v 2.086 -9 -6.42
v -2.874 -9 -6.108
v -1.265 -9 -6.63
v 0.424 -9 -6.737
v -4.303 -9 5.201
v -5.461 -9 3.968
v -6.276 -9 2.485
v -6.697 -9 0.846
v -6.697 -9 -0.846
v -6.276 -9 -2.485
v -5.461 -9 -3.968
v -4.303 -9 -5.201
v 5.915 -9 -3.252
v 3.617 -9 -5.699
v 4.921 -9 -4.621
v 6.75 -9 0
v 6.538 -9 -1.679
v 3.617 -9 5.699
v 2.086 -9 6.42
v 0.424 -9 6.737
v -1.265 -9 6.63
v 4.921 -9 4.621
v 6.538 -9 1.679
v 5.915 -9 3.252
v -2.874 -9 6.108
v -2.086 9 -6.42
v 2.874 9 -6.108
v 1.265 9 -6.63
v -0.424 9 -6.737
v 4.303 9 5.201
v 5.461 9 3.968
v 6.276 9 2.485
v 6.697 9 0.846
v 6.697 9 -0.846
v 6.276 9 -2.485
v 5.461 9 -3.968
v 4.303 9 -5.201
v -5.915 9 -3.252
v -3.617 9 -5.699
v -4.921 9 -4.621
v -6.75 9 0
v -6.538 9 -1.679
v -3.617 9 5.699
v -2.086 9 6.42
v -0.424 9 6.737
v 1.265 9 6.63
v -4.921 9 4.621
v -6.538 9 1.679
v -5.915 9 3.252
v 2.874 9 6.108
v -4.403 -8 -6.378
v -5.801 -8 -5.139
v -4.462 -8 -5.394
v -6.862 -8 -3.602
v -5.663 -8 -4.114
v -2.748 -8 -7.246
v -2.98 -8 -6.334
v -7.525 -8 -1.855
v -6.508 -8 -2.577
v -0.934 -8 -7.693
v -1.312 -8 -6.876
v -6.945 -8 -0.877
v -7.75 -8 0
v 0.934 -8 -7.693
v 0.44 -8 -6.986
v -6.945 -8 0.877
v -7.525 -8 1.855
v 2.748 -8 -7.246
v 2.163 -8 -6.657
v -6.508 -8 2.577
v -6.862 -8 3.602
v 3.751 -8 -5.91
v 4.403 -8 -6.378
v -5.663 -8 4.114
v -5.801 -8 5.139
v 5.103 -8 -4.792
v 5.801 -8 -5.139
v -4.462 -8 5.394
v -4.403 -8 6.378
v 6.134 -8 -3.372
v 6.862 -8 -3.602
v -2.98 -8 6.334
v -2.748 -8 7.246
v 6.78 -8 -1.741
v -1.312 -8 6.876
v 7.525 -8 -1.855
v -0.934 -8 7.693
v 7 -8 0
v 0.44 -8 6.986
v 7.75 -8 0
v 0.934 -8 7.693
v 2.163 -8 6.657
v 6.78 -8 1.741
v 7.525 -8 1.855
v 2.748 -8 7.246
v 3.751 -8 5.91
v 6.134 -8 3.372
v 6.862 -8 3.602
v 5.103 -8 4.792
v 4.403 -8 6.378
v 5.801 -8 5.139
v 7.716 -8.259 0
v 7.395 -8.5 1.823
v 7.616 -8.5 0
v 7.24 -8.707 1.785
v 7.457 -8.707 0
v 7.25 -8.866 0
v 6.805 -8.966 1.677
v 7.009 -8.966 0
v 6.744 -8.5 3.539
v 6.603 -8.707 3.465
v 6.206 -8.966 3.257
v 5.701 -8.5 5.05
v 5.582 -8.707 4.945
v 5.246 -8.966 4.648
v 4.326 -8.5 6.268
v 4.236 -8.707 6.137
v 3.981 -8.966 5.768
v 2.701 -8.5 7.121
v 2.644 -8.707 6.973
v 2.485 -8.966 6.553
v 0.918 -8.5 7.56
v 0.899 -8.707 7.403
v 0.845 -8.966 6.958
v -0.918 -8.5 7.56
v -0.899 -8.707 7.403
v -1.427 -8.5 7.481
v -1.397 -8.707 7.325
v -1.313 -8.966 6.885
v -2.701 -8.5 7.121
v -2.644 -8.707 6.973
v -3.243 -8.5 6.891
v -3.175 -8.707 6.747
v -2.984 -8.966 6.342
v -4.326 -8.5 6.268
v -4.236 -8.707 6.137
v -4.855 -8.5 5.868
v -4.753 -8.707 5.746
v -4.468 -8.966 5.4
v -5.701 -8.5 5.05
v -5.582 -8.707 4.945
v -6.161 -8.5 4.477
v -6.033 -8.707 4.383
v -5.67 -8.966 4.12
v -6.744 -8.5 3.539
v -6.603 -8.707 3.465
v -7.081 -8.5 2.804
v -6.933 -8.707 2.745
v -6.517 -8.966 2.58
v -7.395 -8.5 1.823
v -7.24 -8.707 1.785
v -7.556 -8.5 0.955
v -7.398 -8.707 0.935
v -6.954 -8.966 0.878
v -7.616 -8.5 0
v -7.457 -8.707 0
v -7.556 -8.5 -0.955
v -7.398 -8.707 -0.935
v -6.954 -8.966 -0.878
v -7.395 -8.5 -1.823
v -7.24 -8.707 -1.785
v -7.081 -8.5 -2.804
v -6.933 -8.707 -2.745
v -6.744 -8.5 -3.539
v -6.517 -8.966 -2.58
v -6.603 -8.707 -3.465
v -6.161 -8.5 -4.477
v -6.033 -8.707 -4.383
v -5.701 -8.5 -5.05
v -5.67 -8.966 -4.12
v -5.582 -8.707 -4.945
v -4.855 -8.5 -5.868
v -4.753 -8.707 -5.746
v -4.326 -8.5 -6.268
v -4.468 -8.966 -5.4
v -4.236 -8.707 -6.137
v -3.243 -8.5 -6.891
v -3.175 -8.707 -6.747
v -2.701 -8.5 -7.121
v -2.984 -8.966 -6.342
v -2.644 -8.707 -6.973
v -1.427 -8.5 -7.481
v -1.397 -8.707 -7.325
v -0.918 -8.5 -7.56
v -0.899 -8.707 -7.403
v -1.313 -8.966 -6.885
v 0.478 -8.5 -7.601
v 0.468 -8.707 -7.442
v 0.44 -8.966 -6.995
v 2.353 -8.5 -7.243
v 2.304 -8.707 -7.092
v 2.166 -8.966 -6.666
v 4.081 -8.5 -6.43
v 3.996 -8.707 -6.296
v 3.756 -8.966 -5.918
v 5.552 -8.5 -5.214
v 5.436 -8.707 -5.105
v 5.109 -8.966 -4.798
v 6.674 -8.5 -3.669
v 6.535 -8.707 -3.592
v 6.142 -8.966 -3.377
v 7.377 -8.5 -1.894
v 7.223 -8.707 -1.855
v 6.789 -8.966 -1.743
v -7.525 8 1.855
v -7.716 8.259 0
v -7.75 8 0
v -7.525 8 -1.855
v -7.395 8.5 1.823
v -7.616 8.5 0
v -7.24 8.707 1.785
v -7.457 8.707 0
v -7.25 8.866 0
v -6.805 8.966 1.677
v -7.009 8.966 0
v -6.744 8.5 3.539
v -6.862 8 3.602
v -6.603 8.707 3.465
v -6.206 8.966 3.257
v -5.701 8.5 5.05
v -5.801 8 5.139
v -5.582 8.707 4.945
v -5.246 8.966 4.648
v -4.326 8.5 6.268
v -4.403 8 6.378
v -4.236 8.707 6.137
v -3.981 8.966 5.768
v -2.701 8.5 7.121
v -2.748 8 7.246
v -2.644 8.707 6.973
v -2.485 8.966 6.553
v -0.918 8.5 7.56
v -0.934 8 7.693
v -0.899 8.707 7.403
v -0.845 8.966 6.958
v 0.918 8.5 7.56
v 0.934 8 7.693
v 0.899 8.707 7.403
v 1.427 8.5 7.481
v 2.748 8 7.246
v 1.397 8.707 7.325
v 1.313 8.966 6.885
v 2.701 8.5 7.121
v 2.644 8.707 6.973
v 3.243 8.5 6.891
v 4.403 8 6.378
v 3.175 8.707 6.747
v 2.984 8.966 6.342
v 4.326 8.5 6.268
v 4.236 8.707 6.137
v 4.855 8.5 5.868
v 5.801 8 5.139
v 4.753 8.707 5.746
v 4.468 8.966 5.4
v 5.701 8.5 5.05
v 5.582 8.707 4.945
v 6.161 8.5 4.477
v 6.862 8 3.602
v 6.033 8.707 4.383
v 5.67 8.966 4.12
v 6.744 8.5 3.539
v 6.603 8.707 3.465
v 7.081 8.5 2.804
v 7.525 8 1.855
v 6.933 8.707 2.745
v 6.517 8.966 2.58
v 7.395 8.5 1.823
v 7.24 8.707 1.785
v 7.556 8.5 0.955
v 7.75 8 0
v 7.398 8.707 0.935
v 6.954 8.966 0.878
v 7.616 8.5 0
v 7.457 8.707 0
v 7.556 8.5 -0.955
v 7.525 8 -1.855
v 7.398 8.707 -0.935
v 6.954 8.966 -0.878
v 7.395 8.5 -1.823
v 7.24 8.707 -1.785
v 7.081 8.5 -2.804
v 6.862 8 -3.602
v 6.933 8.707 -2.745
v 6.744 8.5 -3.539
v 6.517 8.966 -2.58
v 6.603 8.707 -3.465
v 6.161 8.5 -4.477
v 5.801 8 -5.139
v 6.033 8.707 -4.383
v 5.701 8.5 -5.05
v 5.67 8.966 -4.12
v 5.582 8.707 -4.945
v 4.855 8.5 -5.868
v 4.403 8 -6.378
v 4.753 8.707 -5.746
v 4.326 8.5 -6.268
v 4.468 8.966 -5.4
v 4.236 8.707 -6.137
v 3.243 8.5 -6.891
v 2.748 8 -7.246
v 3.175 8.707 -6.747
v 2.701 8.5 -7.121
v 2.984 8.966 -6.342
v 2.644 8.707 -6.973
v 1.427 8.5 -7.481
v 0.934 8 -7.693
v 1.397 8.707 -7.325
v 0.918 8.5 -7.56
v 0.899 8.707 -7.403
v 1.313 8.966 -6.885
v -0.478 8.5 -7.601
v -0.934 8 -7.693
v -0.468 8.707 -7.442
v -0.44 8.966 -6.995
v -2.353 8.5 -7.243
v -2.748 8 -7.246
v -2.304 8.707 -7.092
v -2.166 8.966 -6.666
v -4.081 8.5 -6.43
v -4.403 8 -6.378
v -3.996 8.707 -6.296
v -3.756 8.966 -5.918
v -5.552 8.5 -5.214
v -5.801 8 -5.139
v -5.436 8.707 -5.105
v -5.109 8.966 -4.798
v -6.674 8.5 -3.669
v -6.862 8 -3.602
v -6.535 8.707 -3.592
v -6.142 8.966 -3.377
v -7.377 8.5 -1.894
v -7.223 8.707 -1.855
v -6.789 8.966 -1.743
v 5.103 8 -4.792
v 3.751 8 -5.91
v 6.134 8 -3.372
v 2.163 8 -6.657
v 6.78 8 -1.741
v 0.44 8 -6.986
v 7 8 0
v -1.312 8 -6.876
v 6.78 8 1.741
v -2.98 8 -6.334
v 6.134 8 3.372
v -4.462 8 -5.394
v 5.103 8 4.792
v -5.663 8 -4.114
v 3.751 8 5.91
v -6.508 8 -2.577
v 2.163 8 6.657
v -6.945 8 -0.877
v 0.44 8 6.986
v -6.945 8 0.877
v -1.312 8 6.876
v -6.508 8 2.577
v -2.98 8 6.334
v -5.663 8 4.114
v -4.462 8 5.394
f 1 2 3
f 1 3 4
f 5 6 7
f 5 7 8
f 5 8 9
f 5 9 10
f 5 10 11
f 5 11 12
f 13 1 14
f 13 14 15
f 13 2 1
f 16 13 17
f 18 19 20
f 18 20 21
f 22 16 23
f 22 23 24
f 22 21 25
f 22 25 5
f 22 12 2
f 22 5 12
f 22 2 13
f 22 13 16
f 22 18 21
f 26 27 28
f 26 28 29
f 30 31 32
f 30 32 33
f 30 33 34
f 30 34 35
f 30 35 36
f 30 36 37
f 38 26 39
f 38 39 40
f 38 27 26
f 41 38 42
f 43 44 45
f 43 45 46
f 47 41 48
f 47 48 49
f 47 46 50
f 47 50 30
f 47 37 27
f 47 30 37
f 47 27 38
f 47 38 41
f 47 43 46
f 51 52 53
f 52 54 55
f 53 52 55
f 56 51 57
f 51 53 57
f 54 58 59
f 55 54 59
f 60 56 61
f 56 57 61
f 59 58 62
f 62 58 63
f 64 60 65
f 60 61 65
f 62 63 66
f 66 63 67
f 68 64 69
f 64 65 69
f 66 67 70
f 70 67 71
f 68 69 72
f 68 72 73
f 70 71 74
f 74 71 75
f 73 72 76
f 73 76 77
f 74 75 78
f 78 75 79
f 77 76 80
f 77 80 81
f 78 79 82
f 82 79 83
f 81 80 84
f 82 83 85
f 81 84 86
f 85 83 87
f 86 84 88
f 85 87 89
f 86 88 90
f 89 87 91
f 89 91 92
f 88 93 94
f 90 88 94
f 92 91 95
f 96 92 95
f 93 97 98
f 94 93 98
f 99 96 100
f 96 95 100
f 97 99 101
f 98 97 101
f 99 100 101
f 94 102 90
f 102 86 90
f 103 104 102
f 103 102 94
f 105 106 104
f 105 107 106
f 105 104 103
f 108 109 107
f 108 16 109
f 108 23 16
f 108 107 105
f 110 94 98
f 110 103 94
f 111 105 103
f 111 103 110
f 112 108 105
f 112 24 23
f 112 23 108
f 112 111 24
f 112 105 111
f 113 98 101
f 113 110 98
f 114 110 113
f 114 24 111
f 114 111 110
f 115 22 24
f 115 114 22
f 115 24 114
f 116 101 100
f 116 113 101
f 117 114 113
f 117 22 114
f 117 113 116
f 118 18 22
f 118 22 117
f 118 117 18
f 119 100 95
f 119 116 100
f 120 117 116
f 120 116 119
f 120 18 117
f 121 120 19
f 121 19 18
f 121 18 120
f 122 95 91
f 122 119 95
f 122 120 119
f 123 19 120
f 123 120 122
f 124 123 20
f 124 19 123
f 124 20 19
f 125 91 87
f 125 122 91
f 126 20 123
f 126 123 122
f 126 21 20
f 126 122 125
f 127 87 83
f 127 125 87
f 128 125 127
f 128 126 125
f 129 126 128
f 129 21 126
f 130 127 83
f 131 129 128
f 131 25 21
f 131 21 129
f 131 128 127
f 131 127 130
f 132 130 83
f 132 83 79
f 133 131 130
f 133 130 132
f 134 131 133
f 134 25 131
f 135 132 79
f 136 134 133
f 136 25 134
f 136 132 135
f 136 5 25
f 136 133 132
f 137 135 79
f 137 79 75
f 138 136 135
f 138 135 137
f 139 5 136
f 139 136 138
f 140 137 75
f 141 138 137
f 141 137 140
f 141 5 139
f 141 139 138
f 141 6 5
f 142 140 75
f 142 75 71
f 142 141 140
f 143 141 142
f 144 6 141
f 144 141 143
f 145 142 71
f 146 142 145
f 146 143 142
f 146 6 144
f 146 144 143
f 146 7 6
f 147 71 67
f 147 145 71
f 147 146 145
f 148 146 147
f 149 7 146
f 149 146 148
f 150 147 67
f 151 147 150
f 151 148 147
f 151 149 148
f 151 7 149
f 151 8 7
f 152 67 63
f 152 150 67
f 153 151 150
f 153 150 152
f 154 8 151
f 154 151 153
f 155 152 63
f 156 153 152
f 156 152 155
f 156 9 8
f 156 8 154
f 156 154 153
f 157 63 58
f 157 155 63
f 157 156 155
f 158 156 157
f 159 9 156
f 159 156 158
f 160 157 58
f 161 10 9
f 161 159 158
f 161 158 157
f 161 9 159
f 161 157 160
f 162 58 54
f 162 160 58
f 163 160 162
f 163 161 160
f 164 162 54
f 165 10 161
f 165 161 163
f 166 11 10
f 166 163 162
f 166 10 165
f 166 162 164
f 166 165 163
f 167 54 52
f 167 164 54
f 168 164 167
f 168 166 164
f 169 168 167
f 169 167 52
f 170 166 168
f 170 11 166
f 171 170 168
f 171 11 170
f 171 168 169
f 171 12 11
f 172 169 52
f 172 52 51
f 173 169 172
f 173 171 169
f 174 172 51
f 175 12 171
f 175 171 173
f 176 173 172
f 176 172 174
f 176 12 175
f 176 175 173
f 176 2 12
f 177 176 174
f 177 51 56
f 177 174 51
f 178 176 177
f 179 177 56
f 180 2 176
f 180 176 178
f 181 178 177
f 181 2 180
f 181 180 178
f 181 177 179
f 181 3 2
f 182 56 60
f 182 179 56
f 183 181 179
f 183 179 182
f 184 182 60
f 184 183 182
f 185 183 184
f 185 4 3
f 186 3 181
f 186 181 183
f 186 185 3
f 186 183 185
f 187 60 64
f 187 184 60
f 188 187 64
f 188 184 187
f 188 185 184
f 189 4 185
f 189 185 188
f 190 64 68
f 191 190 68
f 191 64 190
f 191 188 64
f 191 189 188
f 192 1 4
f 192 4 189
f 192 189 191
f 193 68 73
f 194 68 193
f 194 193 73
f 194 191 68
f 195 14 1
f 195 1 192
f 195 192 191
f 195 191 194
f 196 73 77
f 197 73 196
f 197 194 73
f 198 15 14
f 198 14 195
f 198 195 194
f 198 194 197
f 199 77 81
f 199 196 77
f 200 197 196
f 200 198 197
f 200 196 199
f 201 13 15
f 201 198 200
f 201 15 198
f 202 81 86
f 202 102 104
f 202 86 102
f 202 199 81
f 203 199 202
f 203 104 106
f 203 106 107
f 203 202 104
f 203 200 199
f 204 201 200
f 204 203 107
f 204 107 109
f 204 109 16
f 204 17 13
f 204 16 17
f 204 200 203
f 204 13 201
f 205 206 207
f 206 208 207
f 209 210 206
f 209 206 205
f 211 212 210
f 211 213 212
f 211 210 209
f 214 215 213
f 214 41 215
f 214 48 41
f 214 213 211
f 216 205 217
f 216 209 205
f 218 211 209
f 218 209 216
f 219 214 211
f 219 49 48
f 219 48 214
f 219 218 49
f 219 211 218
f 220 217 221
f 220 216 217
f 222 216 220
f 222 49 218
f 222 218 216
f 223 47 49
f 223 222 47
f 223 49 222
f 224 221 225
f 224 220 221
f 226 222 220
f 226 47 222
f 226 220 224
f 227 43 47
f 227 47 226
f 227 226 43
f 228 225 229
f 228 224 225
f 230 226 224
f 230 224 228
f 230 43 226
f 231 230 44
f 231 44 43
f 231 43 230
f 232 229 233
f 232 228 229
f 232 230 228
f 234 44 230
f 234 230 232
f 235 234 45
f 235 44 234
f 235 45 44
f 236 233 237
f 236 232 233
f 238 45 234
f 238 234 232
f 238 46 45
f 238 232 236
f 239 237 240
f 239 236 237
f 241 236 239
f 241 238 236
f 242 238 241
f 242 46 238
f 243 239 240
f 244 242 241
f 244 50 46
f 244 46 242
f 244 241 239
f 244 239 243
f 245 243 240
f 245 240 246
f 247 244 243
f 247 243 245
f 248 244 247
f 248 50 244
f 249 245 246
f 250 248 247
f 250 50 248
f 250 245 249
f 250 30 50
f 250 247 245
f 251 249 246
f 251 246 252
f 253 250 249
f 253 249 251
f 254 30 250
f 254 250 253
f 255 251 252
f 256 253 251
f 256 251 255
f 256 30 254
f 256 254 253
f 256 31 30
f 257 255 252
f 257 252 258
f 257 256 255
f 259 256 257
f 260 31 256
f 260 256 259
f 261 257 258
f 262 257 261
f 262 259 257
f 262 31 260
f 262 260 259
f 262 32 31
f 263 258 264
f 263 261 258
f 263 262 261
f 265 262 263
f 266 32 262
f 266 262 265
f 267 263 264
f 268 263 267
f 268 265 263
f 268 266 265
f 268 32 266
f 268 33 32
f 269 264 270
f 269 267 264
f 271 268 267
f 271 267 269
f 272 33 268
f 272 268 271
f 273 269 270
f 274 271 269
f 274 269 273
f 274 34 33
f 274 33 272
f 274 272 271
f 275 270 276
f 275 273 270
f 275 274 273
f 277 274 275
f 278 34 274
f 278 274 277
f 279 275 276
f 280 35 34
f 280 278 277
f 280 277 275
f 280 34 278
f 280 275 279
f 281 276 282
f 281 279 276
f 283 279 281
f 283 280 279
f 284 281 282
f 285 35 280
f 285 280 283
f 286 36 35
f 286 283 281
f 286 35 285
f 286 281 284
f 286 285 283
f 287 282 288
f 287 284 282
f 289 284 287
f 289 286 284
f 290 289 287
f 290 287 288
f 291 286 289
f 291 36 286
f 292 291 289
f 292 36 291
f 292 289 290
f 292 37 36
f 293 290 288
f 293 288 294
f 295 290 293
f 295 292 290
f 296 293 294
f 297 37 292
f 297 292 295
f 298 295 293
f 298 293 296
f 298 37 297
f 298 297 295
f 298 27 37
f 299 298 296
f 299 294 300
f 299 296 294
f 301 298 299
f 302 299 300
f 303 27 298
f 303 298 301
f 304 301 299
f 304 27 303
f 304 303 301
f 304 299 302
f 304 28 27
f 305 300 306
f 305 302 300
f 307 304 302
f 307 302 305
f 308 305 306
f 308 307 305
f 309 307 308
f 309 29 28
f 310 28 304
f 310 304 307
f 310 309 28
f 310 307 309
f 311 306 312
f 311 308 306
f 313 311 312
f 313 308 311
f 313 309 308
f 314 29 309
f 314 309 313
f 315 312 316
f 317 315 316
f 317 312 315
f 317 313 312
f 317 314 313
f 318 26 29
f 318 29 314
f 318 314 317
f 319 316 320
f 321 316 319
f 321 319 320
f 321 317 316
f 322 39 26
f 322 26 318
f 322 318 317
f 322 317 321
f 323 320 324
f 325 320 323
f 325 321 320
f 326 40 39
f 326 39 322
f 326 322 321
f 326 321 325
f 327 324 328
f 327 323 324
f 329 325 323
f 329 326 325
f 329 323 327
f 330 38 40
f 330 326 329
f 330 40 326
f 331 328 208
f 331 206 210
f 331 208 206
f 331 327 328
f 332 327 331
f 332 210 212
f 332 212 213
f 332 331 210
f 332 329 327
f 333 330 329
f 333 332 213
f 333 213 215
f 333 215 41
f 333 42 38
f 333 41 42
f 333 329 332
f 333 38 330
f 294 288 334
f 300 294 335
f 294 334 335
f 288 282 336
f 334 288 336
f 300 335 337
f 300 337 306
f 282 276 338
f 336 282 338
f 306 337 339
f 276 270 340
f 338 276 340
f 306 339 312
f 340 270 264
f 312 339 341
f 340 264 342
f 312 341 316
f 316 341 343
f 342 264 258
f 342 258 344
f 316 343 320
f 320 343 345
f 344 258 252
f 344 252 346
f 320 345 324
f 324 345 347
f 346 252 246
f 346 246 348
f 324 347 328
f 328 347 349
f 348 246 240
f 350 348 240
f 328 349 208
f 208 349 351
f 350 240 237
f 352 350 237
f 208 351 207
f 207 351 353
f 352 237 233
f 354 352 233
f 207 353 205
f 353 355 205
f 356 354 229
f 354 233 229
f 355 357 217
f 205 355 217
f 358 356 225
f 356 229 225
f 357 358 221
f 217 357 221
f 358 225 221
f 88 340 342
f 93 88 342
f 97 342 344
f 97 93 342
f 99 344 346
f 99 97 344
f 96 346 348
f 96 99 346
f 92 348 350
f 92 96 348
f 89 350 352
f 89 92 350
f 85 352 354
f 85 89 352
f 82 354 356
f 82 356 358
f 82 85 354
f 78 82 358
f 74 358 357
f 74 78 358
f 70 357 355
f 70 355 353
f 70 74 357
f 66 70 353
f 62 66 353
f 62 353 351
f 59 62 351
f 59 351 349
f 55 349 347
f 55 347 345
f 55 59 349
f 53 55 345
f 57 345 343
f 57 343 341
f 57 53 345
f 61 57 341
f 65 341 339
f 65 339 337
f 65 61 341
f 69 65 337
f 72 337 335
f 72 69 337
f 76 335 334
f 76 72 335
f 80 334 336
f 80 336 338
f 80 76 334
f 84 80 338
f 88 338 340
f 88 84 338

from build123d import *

# Parameters (mm, degrees)
F0_R     = 7
F1_DEPTH = 8
F2_R     = 7.75
F2_R_2   = 7
F3_DEPTH = 1
F4_R     = 7.75
F4_R_2   = 7
F5_DEPTH = 1
F6_R     = 0.99999


# Not quite as in the source:
# - a fillet or chamfer is up to 0.001 mm smaller than in the source, because OpenCascade refuses the exact size


with BuildPart() as f1:
    # F0 (on Front) → F1 (new body, symmetric)
    with BuildSketch(Plane.XZ):
        Circle(F0_R)
    extrude(amount=F1_DEPTH, both=True)

    # F2 (on face) → F3 (join)
    with BuildSketch(Plane.XZ.offset(8)):
        Circle(F2_R)
        Circle(F2_R_2, mode=Mode.SUBTRACT)
        Circle(F2_R_2)
    extrude(amount=F3_DEPTH)

    # F4 (on face) → F5 (join)
    with BuildSketch(Plane(origin=(0, 8, 0), x_dir=(-1, 0, 0), z_dir=(0, 1, 0))):
        Circle(F4_R)
        Circle(F4_R_2, mode=Mode.SUBTRACT)
        Circle(F4_R_2)
    extrude(amount=F5_DEPTH)

    # F6 (radius 1 in the source; OpenCascade refuses exactly that, so slightly less here)
    f6_edges = [f1.edges().sort_by_distance(p)[0] for p in [
        (-7.75, -9, 0),
        (7.75, 9, 0),
    ]]
    fillet(f6_edges, radius=F6_R)


solid = f1.part
